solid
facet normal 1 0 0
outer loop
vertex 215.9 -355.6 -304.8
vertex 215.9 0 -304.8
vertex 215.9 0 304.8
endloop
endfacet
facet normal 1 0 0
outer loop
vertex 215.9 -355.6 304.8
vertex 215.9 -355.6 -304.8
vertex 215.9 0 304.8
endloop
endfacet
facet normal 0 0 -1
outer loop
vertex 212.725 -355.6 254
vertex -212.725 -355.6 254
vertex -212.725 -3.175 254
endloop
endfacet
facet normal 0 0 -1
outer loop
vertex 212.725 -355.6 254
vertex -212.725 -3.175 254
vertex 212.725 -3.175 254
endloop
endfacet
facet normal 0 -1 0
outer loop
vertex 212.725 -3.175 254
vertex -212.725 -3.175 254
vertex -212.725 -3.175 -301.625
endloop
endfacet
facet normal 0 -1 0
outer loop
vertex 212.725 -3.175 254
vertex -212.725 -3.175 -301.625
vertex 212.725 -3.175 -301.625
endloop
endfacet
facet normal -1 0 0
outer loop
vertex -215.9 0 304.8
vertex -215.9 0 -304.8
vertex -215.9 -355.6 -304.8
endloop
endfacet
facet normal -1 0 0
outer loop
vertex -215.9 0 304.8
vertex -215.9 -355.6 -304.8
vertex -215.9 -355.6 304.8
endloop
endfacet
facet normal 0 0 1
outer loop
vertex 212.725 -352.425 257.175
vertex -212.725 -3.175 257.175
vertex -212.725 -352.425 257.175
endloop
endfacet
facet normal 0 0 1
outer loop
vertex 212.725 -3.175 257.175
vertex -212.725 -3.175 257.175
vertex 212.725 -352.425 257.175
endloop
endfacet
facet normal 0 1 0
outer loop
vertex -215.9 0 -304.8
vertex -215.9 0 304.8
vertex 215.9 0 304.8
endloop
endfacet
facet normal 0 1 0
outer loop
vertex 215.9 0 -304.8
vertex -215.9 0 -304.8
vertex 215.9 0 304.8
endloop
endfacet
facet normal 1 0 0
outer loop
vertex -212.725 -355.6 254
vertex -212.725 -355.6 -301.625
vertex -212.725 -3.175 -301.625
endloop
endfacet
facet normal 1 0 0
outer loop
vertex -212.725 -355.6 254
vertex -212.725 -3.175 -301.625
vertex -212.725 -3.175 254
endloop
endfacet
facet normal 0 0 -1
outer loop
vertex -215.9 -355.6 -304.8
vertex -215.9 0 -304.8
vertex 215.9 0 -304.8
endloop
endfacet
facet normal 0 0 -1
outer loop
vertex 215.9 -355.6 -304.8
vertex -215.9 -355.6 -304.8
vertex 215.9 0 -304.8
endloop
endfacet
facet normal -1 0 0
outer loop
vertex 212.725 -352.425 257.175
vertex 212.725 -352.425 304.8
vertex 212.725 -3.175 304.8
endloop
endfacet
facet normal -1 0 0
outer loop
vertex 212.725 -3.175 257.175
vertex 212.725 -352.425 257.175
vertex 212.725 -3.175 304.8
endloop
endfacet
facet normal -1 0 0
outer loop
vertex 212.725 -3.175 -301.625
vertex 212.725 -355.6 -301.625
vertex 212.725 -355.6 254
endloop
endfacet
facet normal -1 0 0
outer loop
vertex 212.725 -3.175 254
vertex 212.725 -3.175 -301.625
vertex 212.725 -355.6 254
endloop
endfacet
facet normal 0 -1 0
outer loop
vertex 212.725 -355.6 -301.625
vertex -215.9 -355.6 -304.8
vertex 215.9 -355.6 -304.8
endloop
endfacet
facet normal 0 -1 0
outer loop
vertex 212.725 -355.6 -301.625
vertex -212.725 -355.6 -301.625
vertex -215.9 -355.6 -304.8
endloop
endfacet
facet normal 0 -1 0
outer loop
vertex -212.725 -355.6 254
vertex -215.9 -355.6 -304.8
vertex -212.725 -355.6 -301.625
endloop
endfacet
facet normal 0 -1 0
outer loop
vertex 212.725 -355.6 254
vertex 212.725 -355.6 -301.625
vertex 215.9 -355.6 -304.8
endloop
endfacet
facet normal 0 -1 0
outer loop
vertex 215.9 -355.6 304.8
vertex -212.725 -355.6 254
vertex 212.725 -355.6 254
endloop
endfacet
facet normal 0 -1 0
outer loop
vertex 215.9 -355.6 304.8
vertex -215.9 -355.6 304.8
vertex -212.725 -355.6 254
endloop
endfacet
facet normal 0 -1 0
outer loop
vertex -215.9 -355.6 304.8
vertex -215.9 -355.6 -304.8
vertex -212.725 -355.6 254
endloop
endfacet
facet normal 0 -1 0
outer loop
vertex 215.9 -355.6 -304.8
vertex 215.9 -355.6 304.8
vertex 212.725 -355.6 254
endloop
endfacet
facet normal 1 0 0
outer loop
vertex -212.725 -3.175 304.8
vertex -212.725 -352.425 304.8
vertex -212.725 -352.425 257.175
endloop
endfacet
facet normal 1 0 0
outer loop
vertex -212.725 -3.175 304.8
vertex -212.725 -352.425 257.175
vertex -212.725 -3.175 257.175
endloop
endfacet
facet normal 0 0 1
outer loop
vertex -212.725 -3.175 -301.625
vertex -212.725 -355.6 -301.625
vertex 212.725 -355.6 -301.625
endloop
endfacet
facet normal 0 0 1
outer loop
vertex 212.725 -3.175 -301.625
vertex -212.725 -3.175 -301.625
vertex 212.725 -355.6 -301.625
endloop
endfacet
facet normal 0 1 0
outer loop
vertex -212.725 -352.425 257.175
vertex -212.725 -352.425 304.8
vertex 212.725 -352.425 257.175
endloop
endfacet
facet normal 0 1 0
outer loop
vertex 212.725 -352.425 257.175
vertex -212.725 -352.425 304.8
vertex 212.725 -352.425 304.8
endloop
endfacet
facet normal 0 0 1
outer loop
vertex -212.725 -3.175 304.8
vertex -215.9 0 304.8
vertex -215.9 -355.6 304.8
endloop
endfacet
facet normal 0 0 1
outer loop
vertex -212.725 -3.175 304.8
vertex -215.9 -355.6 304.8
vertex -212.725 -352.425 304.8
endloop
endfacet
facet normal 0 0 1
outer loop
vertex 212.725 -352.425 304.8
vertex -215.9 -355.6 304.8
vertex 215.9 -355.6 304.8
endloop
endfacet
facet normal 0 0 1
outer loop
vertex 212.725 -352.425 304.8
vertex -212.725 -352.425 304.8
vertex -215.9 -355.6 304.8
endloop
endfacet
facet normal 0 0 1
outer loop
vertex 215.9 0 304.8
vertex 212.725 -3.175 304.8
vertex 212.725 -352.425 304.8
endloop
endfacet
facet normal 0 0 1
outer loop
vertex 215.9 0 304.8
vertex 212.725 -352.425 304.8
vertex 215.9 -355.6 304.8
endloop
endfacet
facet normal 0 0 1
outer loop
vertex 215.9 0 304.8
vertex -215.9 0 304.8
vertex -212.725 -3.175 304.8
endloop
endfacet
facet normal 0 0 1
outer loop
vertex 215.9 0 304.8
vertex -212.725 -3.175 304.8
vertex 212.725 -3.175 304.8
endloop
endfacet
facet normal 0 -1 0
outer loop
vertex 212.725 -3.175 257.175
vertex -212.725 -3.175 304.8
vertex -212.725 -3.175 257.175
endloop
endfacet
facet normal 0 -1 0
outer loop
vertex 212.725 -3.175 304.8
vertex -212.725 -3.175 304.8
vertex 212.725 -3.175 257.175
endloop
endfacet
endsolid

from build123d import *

# Parameters (mm, degrees)
F0_W     = 431.8
F0_H     = 609.6
F1_DEPTH = 355.6
F2_W     = 425.45
F2_H     = 555.625
F3_DEPTH = 352.425
F4_W     = 425.45
F4_H     = 349.25
F5_DEPTH = 47.625


with BuildPart() as f1:
    # F0 (on Front) → F1 (new body)
    with BuildSketch(Plane.XZ):
        Rectangle(F0_W, F0_H)
    extrude(amount=F1_DEPTH)

    # F2 (on face) → F3 (cut)
    with BuildSketch(Plane.XZ.offset(355.6)):
        with Locations((0, -23.8125)):
            Rectangle(F2_W, F2_H)
    extrude(amount=-F3_DEPTH, mode=Mode.SUBTRACT)

    # F4 (on face) → F5 (cut)
    with BuildSketch(Plane.XY.offset(304.8)):
        with Locations((0, -177.8)):
            Rectangle(F4_W, F4_H)
    extrude(amount=-F5_DEPTH, mode=Mode.SUBTRACT)


solid = f1.part
